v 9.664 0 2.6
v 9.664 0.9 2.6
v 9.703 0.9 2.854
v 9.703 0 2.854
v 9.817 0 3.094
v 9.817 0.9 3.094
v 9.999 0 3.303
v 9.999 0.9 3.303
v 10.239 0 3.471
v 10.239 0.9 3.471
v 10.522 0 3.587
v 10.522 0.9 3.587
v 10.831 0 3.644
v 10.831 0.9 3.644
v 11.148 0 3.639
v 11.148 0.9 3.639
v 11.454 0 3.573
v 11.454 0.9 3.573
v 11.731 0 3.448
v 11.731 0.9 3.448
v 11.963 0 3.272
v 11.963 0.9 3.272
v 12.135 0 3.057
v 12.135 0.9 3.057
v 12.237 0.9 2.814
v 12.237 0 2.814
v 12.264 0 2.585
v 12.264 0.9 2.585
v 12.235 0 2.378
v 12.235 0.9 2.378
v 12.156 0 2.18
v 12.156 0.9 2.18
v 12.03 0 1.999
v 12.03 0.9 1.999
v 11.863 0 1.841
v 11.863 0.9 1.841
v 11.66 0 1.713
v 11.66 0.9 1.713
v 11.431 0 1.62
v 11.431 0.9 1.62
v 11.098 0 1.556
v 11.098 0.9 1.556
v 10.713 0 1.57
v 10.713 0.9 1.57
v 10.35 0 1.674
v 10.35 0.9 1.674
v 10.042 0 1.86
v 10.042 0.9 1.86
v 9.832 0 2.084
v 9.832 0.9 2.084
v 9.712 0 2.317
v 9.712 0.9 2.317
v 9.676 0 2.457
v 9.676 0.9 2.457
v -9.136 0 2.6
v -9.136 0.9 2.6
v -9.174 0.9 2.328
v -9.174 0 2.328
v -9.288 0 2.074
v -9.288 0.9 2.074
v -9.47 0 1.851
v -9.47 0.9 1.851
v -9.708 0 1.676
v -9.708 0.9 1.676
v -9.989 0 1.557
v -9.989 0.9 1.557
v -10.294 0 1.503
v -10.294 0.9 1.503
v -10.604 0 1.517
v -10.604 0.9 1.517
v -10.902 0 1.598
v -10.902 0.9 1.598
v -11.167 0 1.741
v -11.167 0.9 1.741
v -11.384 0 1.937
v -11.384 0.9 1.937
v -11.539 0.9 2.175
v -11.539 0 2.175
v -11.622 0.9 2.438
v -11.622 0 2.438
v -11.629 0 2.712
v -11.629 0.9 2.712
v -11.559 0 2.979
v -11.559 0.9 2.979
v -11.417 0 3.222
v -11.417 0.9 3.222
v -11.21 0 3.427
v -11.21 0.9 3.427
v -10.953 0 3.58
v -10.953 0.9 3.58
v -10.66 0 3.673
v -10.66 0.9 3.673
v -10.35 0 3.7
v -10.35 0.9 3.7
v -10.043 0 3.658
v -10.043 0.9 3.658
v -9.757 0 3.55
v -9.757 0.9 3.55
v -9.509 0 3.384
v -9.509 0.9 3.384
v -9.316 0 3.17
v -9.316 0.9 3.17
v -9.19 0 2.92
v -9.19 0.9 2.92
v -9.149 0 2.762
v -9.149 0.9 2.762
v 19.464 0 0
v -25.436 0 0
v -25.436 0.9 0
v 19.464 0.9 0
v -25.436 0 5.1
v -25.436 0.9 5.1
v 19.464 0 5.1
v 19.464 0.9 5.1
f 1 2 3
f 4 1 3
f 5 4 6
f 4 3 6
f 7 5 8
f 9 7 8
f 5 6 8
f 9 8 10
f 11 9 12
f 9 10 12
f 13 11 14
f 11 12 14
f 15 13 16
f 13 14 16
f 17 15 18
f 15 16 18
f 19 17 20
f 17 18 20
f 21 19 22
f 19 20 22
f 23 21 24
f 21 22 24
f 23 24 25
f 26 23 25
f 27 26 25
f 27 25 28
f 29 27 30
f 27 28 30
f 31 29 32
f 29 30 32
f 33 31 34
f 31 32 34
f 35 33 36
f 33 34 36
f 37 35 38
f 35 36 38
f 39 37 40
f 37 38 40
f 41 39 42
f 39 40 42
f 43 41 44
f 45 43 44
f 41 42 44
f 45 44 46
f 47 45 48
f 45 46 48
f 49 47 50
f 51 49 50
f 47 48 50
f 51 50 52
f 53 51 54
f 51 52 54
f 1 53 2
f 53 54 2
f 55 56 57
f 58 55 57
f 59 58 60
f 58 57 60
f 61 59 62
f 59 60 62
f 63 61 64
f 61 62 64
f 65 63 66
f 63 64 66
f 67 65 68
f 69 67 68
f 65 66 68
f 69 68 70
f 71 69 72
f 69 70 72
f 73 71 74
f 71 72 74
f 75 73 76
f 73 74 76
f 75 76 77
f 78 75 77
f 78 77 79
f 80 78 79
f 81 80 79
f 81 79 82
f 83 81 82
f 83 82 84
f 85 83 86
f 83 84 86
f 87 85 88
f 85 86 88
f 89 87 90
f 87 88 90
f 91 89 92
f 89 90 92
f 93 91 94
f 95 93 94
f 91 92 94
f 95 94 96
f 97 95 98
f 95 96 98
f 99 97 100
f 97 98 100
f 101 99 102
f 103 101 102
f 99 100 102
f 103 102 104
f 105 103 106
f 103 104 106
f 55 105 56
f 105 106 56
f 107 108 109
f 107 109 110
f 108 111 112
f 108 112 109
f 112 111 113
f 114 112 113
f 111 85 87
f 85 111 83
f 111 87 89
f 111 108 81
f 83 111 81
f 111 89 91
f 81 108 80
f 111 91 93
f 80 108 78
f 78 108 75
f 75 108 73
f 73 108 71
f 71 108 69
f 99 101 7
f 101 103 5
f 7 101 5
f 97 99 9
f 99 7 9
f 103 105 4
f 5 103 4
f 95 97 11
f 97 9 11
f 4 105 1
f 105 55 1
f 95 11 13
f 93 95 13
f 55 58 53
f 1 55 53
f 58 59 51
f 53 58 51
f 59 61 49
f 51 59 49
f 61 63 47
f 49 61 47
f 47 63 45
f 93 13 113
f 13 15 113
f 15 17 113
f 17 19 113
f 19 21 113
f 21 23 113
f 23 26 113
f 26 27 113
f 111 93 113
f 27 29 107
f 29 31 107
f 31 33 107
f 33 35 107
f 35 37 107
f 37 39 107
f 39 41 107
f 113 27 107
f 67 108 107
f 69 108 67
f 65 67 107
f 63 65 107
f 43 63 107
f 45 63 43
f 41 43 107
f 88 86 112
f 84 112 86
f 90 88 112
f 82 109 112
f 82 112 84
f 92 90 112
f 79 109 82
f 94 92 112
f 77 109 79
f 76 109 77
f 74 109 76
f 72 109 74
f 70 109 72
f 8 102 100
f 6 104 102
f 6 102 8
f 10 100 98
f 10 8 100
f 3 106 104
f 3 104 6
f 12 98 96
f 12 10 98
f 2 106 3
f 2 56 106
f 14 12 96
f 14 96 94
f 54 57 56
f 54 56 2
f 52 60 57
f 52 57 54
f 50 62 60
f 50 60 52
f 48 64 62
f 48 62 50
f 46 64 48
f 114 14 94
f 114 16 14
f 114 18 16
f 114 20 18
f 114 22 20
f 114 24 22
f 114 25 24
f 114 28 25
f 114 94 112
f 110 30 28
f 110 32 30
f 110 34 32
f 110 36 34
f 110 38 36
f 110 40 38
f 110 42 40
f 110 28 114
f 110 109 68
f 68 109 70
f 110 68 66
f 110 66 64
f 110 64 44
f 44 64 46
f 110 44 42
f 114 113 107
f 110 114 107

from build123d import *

# Parameters (mm, degrees)
SKETCH1_W           = 44.9
SKETCH1_H           = 5.1
BOSS_EXTRUDE2_DEPTH = 0.9
SKETCH3_RX          = 1.25
SKETCH3_RY          = 1.1
SKETCH3_RX_2        = 1.3
SKETCH3_RY_2        = 1.05
CUT_EXTRUDE4_DEPTH  = 0.9


with BuildPart() as part:
    # Sketch1 → Boss-Extrude2 (new body)
    with BuildSketch(Plane(origin=(0, 0, 0), x_dir=(1, 0, 0), z_dir=(0, 1, 0))):
        with Locations((-2.985779817, -2.55)):
            Rectangle(SKETCH1_W, SKETCH1_H)
    extrude(amount=BOSS_EXTRUDE2_DEPTH)

    # Sketch3 → Cut-Extrude4 (cut)
    with BuildSketch(Plane(origin=(0, 0.9, 0), x_dir=(1, 0, 0), z_dir=(0, 1, 0))):
        with Locations((-10.385779817, -2.6)):
            Ellipse(SKETCH3_RX, SKETCH3_RY)
        with Locations(Location((10.964220183, -2.6), (0, 0, 180))):
            Ellipse(SKETCH3_RX_2, SKETCH3_RY_2)
    extrude(amount=-CUT_EXTRUDE4_DEPTH, mode=Mode.SUBTRACT)


solid = part.part
